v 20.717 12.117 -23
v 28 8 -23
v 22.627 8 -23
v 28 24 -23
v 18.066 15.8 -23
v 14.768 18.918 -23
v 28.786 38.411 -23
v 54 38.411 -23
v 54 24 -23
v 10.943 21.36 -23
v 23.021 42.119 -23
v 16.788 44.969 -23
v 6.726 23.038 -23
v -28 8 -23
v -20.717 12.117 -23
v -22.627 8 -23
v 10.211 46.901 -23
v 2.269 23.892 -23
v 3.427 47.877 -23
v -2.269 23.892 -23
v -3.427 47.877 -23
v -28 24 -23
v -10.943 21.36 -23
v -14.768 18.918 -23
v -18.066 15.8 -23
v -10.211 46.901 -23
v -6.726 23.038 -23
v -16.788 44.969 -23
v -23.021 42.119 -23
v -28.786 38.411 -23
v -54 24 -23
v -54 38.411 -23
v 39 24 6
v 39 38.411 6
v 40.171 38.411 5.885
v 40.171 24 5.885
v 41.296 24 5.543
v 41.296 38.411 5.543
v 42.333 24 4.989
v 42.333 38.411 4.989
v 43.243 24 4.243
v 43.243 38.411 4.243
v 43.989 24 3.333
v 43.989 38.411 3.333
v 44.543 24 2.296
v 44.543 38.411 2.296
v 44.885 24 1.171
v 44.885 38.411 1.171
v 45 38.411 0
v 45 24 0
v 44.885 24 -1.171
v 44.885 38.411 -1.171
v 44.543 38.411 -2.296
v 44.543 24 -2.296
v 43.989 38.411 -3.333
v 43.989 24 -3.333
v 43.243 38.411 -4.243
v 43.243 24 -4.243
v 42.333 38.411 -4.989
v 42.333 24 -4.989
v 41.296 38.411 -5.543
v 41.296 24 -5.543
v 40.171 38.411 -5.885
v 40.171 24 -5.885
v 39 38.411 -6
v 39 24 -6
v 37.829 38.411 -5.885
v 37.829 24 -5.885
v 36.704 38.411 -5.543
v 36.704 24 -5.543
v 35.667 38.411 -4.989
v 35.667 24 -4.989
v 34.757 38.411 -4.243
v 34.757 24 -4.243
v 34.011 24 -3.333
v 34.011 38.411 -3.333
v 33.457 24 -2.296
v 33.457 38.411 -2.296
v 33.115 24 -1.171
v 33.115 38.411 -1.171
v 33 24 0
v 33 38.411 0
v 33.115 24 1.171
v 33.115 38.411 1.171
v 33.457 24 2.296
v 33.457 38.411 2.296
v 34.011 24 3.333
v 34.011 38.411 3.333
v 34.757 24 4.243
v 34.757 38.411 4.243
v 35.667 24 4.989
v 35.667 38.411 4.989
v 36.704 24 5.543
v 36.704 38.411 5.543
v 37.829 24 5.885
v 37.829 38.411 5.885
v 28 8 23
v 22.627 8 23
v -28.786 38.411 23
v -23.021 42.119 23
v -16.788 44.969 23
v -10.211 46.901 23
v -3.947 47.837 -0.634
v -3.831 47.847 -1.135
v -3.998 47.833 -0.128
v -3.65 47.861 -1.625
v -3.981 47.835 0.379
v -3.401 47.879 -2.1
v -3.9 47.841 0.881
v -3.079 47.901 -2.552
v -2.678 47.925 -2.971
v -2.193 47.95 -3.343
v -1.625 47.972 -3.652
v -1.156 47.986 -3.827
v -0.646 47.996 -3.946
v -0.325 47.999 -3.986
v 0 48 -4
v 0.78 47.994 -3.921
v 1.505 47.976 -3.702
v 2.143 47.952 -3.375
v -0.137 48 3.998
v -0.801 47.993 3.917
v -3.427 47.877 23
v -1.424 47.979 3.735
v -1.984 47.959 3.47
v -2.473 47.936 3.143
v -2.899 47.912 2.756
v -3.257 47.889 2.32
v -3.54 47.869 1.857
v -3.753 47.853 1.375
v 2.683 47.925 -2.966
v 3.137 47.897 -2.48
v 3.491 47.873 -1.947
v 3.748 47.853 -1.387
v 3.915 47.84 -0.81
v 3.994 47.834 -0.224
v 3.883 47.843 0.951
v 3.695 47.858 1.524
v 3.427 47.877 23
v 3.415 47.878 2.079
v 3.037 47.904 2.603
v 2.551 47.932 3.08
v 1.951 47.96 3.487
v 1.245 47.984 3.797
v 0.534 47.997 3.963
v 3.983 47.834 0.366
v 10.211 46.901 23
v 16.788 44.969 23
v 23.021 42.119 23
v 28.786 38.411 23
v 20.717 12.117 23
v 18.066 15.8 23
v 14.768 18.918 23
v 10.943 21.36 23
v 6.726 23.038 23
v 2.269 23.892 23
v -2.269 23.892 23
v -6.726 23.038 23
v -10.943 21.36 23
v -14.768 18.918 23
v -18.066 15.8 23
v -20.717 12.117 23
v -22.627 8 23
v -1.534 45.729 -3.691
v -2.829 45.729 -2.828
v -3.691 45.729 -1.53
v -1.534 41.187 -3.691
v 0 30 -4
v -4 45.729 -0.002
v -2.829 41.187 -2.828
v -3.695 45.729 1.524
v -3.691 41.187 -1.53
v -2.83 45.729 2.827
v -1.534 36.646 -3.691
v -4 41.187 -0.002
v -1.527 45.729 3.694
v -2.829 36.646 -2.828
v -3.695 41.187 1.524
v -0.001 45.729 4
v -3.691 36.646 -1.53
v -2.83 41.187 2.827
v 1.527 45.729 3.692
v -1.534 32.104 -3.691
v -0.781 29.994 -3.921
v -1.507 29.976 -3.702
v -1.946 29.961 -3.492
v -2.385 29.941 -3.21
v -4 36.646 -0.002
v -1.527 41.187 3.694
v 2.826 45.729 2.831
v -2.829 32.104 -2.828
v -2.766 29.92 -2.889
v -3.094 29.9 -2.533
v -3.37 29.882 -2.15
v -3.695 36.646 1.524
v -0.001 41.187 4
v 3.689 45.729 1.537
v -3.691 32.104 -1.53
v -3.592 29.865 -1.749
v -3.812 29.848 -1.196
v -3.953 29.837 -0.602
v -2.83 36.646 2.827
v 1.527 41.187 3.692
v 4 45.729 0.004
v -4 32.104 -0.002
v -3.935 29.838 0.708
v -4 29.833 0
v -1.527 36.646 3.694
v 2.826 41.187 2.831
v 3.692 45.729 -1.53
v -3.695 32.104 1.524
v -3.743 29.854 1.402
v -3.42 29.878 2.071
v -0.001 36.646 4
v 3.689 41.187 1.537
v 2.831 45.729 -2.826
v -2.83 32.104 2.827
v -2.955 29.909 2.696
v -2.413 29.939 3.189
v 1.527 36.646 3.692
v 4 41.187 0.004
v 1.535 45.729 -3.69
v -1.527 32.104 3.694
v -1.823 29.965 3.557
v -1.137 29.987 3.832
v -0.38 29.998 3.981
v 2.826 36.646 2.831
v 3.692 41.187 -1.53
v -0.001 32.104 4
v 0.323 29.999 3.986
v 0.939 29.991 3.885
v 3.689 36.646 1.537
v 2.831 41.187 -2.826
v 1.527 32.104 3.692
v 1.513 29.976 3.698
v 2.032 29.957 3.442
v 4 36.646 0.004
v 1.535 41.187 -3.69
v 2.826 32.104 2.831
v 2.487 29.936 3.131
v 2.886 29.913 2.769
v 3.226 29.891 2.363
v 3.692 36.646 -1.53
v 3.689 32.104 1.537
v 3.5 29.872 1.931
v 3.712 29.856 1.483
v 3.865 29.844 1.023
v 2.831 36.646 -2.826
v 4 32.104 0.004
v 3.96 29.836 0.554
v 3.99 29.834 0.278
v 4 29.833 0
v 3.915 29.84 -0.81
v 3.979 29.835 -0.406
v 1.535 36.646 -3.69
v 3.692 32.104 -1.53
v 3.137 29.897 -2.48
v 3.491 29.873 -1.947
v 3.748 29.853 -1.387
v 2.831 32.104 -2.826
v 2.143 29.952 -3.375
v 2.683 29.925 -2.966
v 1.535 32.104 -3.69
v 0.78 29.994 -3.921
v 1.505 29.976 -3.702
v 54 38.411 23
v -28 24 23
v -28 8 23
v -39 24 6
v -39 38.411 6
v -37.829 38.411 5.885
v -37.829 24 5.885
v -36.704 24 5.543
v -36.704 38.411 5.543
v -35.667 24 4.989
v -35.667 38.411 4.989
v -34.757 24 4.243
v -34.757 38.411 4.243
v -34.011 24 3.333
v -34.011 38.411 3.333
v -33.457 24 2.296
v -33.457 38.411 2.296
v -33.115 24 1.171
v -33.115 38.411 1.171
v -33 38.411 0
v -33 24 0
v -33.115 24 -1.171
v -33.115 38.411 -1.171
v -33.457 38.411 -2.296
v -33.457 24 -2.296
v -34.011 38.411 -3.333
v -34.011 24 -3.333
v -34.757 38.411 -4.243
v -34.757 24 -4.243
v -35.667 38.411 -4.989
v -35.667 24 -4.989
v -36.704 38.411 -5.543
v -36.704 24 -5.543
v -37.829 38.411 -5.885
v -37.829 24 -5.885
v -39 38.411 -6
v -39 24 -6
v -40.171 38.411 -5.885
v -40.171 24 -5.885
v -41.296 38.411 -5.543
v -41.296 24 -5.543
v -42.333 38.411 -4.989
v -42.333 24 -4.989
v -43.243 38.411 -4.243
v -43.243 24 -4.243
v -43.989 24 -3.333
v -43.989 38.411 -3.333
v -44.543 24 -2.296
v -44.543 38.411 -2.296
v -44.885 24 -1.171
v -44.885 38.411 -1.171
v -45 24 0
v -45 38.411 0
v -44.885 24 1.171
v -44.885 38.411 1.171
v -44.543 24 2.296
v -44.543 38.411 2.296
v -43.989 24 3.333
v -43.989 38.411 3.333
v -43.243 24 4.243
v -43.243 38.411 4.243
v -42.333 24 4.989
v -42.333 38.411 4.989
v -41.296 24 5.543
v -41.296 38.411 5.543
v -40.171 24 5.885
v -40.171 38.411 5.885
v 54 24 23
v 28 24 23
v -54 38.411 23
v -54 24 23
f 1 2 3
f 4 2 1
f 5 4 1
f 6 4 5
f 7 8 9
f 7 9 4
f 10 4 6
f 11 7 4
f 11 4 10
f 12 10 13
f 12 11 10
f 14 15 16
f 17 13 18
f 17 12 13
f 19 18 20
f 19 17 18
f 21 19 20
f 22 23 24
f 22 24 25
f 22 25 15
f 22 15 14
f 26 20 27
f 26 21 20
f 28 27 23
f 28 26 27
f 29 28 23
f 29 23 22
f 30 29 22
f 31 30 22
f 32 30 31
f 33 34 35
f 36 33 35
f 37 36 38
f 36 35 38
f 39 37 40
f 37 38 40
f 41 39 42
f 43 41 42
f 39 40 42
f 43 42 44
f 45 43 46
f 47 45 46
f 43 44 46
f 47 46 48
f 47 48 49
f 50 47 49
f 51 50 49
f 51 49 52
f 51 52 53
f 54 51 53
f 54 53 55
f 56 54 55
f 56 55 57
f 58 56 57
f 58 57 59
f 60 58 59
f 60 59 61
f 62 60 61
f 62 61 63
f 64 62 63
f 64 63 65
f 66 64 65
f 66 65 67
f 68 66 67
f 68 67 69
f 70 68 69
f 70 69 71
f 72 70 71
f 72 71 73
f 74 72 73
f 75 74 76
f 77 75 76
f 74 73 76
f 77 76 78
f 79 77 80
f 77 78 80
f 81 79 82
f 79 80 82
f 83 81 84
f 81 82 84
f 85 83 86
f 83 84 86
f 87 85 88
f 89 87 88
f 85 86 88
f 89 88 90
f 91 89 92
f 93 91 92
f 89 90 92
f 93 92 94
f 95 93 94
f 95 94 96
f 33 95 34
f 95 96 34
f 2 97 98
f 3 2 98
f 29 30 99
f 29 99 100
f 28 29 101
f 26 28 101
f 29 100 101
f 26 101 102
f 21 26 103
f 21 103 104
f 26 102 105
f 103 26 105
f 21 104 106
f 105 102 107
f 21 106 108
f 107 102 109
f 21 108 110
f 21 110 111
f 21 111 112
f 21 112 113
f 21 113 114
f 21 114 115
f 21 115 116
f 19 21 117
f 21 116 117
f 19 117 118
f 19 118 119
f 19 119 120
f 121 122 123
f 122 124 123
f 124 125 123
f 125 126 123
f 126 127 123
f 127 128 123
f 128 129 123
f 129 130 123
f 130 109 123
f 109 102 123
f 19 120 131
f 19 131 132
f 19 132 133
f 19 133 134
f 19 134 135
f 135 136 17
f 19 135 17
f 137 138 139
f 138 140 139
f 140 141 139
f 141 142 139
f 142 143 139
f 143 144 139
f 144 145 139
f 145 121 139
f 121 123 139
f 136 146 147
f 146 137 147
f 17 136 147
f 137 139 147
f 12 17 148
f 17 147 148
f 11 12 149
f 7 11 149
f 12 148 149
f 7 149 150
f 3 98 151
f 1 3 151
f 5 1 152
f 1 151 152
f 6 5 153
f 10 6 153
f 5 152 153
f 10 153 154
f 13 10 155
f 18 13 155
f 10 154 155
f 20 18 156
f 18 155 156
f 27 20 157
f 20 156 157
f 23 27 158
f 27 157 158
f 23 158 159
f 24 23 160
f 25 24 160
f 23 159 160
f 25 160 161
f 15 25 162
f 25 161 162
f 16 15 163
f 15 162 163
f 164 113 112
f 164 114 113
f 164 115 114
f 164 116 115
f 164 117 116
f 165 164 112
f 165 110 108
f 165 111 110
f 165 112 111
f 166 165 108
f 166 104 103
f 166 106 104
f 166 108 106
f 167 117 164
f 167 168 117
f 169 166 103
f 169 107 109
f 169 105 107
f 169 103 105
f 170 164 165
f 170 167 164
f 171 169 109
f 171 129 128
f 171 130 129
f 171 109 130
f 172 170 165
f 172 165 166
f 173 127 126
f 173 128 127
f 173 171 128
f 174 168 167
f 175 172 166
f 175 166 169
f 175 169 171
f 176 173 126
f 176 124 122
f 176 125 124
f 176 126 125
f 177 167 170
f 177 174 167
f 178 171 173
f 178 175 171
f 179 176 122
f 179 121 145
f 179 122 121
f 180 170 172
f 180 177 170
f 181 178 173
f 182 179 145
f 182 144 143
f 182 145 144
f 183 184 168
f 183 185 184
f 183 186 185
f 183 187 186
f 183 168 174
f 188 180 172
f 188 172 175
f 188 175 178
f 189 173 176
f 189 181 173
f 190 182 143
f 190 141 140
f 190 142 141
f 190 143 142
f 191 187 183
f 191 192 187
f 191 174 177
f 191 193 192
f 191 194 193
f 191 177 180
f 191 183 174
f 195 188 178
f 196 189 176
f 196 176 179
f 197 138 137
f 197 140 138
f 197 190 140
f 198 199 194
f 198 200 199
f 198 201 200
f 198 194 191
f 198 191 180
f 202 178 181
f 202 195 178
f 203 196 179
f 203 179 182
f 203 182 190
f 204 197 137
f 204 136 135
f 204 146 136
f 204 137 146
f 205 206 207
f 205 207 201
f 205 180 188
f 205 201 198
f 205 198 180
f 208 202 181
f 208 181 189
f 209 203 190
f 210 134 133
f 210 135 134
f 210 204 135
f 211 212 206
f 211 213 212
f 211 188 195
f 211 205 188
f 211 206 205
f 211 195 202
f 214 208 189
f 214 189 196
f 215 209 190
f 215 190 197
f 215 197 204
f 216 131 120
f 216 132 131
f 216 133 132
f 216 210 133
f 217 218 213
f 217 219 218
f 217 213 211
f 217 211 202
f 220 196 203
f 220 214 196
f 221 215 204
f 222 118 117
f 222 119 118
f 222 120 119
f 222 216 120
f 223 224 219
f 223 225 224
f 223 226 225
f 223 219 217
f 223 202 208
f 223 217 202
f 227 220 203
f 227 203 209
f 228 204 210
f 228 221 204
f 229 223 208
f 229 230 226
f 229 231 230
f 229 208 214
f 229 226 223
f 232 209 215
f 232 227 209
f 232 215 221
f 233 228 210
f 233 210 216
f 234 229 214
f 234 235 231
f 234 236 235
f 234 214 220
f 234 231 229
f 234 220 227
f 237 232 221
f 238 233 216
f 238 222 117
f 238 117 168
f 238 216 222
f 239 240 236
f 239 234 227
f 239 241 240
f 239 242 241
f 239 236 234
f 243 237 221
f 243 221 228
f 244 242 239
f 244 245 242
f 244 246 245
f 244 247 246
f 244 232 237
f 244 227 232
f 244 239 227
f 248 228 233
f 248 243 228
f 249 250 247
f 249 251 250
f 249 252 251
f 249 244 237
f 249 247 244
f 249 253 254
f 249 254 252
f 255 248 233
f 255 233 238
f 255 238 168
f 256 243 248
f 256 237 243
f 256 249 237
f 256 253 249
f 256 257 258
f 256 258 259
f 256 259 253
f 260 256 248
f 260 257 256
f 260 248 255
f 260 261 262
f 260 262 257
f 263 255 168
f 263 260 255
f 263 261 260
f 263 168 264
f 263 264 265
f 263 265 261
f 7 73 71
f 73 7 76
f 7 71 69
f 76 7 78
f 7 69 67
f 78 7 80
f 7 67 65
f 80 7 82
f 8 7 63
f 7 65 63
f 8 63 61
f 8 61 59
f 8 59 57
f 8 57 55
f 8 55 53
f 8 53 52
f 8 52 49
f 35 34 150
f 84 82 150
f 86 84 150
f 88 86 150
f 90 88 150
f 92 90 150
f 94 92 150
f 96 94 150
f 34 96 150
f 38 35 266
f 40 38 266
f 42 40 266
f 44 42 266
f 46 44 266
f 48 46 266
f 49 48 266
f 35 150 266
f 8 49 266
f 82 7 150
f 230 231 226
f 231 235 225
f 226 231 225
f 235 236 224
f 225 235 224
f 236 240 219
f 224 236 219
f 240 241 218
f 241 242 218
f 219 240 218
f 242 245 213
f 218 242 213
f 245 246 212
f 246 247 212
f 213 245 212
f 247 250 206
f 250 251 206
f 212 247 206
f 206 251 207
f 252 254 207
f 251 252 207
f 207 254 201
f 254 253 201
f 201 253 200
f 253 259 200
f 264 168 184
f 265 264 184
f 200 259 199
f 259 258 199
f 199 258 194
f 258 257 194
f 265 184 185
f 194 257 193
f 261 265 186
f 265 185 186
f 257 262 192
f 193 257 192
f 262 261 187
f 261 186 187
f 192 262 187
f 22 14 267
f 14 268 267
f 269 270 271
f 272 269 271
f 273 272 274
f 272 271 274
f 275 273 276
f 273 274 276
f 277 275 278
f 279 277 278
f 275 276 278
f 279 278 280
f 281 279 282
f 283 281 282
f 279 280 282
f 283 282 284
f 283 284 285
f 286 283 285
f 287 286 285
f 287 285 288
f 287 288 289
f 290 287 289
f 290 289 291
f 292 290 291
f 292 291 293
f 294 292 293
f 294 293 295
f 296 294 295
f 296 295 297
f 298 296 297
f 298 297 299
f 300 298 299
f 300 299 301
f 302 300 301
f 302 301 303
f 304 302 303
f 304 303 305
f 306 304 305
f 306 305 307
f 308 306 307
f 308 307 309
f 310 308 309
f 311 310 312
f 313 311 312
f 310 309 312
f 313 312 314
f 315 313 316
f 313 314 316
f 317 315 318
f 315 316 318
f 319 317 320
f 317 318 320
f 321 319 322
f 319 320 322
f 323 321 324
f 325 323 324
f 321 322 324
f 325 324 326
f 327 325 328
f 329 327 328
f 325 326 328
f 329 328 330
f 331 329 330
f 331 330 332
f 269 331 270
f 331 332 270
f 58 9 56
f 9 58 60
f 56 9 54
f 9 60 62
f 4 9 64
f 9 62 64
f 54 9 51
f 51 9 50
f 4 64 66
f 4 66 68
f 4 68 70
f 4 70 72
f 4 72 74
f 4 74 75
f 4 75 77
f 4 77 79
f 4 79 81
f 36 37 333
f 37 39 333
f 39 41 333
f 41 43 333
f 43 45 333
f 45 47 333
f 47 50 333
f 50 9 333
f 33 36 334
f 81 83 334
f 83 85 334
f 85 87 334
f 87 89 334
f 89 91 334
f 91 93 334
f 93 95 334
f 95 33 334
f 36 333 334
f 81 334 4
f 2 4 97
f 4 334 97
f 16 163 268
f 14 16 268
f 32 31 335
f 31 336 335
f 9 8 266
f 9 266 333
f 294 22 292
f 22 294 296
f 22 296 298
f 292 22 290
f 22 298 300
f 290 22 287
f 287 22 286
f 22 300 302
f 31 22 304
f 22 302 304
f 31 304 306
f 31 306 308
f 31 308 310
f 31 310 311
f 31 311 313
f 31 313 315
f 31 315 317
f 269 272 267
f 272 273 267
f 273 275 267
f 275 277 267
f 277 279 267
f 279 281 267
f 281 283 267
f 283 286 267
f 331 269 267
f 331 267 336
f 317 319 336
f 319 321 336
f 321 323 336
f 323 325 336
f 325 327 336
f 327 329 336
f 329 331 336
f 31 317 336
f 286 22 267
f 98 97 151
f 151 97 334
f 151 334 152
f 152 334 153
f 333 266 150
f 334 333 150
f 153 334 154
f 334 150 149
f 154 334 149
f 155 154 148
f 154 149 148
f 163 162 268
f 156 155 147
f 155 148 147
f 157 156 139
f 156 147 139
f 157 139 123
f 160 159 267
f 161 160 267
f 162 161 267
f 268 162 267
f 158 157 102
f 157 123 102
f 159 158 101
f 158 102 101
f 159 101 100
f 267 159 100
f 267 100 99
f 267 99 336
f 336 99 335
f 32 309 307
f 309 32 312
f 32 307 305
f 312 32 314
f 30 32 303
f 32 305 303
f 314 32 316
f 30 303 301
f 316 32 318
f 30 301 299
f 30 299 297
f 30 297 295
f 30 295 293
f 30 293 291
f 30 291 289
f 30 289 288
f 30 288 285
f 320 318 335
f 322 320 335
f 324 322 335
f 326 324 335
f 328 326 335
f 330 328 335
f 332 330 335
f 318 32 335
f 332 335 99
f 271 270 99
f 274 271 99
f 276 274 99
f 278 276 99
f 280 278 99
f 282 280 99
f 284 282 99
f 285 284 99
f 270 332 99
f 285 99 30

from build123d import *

# Parameters (mm, degrees)
BOSS_EXTRUDE1_DEPTH  = 23
SKETCH2_R            = 6
CUT_EXTRUDE1_DEPTH   = 67.104489714
CUT_EXTRUDE2_START   = -8.577540152
CUT_EXTRUDE2_DEPTH   = 19.577540152
CUT_EXTRUDE2_START_2 = -5
CUT_EXTRUDE2_2_DEPTH = 10


with BuildPart() as part:
    # Sketch1 → Boss-Extrude1 (new, symmetric)
    with BuildSketch(Plane.XY):
        with BuildLine():
            Line((-22.627416998, 8), (-28, 8))
            Line((-28, 8), (-28, 24))
            Line((-28, 24), (-54, 24))
            Line((-54, 24), (-54, 38.410583031))
            Line((-54, 38.410583031), (-28.785883888, 38.410583031))
            ThreePointArc((-28.785883888, 38.410583031), (0, 48), (28.785883888, 38.410583031))
            Line((28.785883888, 38.410583031), (54, 38.410583031))
            Line((54, 38.410583031), (54, 24))
            Line((54, 24), (28, 24))
            Line((28, 24), (28, 8))
            Line((28, 8), (22.627416998, 8))
            ThreePointArc((22.627416998, 8), (0, 24), (-22.627416998, 8))
        make_face()
    extrude(amount=BOSS_EXTRUDE1_DEPTH, both=True)

    # Sketch2 → Cut-Extrude1 (cut, through all)
    with BuildSketch(Plane(origin=(0, 38.410583031, 0), x_dir=(1, 0, 0), z_dir=(0, 1, 0))):
        with Locations(Location((-39, 0, 0), (0, 0, 270))):
            Circle(SKETCH2_R)
        with Locations(Location((39, 0, 0), (0, 0, 270))):
            Circle(SKETCH2_R)
    extrude(amount=-CUT_EXTRUDE1_DEPTH, mode=Mode.SUBTRACT)

    # Cut-Extrude2: read off the stored shape, not the designer's step
    # Cut-Extrude2 outline → Cut-Extrude2 (cut)
    with BuildSketch(Plane(origin=(0, 38.410583031, 0), x_dir=(1, 0, 0), z_dir=(0, 1, 0)).offset(CUT_EXTRUDE2_START)):
        with BuildLine():
            add(Edge.make_bspline(
                [(0, 4), (-1.057527997, 4), (-2.091087742, 3.565911724), (-3.566323367, 2.090385612), (-3.999433765, 1.046115956), (-4.00056506, -1.04178128), (-3.576219278, -2.07994956), (-2.083227921, -3.574310552), (-1.045821073, -3.9996204), (1.042915307, -4.000379072), (2.087446575, -3.567981834), (3.563947107, -2.094327717), (3.998968512, -1.060310778), (4.001027689, 1.052513916), (3.568016054, 2.087668509), (2.093312914, 3.564707479), (1.057527997, 4), (0, 4)],
                knots=[0, 0, 0, 0, 0.125, 0.125, 0.25, 0.25, 0.375, 0.375, 0.5, 0.5, 0.625, 0.625, 0.75, 0.75, 0.875, 0.875, 1, 1, 1, 1], degree=3))
        make_face()
    extrude(amount=CUT_EXTRUDE2_DEPTH, mode=Mode.SUBTRACT)

    # Cut-Extrude2 2 outline → Cut-Extrude2 2 (add)
    with BuildSketch(Plane.XY.offset(CUT_EXTRUDE2_START_2)):
        with BuildLine():
            ThreePointArc((4.00000004, 29.83304297), (-2.3e-08, 30), (-4.000000085, 29.833042966))
            Line((-4.000000085, 29.833042966), (4.00000004, 29.83304297))
        make_face()
    extrude(amount=CUT_EXTRUDE2_2_DEPTH)


solid = part.part
